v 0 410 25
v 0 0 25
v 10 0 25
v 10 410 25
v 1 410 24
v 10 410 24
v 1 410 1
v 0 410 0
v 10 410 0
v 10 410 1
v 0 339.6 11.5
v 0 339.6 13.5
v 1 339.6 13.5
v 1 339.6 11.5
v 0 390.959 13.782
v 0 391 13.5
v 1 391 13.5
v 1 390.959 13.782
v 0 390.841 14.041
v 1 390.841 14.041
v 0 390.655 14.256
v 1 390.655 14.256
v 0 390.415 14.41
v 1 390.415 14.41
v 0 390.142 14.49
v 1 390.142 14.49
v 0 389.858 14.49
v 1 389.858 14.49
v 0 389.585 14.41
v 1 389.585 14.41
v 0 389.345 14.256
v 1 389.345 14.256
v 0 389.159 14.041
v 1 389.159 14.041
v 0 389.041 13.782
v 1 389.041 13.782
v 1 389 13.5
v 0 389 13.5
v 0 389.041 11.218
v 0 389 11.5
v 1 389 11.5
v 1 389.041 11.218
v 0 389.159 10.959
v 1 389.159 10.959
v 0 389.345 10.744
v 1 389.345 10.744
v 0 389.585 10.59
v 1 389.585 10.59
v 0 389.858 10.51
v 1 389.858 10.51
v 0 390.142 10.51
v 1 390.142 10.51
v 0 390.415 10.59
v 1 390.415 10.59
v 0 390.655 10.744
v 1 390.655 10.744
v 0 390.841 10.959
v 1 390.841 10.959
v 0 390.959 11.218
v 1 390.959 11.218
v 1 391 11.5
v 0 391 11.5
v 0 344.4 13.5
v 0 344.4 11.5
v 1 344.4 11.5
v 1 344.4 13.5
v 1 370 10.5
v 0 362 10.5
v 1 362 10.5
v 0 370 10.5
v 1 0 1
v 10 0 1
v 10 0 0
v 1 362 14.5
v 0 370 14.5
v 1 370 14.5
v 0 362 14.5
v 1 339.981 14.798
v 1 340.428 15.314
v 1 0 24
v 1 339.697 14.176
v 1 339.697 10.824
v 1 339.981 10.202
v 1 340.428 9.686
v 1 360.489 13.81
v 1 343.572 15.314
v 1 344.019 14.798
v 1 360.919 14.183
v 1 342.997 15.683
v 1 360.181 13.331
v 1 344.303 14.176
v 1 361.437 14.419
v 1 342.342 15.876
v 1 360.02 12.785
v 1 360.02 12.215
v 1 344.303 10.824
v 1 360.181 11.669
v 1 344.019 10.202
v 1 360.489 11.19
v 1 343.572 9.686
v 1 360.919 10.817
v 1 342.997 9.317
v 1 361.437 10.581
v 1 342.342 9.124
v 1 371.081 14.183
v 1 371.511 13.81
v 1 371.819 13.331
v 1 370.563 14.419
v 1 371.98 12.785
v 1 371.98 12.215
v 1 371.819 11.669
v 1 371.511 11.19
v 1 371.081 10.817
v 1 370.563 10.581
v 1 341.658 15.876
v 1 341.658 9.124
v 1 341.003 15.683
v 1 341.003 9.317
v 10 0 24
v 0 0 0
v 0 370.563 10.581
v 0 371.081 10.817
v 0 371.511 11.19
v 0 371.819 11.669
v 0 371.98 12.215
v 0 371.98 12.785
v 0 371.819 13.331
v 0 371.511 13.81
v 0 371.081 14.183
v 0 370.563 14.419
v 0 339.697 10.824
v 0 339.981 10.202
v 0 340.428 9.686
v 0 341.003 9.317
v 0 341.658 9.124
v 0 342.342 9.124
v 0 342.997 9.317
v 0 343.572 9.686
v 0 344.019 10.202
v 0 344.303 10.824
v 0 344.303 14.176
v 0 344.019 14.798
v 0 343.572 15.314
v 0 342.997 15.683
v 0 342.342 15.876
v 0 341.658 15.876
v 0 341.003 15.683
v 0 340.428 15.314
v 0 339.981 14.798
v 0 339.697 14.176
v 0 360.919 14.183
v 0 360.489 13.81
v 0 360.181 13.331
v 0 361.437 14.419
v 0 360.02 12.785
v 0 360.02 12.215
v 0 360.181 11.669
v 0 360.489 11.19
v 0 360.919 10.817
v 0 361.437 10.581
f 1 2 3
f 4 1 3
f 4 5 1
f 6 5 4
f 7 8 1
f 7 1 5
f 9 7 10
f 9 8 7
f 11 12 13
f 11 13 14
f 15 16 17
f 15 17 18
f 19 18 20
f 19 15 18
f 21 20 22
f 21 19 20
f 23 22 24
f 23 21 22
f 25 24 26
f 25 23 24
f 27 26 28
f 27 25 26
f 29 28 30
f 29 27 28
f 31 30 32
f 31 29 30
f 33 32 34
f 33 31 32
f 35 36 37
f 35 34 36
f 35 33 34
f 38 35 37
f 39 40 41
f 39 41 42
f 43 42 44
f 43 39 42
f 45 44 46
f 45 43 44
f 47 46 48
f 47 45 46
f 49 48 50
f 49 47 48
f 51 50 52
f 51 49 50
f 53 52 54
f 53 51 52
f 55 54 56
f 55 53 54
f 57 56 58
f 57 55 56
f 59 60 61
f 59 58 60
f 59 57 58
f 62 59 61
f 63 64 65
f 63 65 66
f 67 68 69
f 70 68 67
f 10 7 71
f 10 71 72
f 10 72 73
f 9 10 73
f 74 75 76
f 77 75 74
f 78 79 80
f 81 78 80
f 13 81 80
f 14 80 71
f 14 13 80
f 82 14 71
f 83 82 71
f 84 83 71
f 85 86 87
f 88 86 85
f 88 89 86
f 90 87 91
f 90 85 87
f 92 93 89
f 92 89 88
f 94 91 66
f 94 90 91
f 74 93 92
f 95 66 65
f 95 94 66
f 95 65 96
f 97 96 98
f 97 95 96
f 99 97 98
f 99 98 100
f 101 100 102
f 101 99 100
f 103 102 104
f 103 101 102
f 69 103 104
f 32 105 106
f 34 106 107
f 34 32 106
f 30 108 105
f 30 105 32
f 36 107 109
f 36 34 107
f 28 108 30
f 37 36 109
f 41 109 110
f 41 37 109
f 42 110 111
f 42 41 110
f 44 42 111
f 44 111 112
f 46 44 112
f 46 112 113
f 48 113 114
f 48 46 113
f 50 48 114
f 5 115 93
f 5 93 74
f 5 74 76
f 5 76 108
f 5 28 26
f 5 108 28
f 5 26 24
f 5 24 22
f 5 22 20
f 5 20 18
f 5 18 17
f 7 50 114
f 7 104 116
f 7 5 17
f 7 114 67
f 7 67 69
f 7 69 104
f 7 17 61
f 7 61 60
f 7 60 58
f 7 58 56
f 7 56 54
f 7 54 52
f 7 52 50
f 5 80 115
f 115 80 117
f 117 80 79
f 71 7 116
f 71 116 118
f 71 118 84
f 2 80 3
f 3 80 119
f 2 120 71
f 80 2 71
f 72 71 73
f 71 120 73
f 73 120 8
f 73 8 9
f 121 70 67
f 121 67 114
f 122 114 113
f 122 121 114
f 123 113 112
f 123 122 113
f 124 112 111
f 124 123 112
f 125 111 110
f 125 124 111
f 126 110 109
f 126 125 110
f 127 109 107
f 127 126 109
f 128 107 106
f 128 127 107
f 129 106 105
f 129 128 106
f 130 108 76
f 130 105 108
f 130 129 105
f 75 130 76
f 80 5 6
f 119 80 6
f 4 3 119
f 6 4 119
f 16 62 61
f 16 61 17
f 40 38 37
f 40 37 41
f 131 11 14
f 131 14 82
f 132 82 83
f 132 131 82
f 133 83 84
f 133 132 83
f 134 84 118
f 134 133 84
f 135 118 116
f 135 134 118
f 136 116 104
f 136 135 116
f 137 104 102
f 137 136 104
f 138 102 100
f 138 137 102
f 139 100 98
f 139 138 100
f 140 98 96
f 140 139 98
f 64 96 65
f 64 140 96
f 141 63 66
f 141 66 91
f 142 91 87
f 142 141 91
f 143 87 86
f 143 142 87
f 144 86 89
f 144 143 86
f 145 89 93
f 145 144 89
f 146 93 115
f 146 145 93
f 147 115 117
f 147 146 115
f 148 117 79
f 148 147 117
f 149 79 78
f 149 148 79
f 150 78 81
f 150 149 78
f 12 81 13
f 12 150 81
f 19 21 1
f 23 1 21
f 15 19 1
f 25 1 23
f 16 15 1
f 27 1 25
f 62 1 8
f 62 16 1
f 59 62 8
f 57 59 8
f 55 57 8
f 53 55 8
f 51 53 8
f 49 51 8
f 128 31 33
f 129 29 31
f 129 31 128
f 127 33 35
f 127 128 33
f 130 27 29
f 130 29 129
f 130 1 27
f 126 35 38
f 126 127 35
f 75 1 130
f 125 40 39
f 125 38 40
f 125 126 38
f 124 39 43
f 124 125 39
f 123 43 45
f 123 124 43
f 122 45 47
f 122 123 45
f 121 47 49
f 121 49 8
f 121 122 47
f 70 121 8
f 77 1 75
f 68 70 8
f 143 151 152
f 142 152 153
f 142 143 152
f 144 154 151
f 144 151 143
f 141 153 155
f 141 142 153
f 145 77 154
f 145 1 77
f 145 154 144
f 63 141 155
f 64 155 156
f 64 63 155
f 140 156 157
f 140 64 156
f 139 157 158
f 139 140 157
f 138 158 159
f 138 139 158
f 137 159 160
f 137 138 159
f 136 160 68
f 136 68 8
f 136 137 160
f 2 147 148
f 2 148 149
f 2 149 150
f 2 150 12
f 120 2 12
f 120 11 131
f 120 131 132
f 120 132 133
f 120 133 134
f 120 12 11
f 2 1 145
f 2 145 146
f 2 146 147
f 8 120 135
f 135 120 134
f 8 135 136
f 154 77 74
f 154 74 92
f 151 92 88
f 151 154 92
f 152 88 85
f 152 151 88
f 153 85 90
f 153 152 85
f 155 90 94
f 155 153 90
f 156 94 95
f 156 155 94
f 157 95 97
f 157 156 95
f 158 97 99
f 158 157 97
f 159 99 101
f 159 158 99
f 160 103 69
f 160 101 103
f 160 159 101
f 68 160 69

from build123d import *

# Parameters (mm, degrees)
SKETCH1_W           = 10
SKETCH1_H           = 25
BOSS_EXTRUDE1_DEPTH = 410
SKETCH2_W           = 9
SKETCH2_H           = 23
CUT_EXTRUDE1_DEPTH  = 410
CUT_EXTRUDE2_DEPTH  = 410
CUT_EXTRUDE3_DEPTH  = 410
CUT_EXTRUDE4_DEPTH  = 410


with BuildPart() as part:
    # Sketch1 → Boss-Extrude1 (new body)
    with BuildSketch(Plane(origin=(0, 0, 0), x_dir=(1, 0, 0), z_dir=(0, 1, 0))):
        with Locations((5, -12.5)):
            Rectangle(SKETCH1_W, SKETCH1_H)
    extrude(amount=BOSS_EXTRUDE1_DEPTH)

    # Sketch2 → Cut-Extrude1 (cut)
    with BuildSketch(Plane(origin=(0, 410, 0), x_dir=(1, 0, 0), z_dir=(0, 1, 0))):
        with Locations((5.5, -12.5)):
            Rectangle(SKETCH2_W, SKETCH2_H)
    extrude(amount=-CUT_EXTRUDE1_DEPTH, mode=Mode.SUBTRACT)

    # Sketch3 → Cut-Extrude2 (cut)
    with BuildSketch(Plane.ZY):
        with BuildLine():
            Line((11.5, 391), (13.5, 391))
            ThreePointArc((13.5, 391), (14.5, 390), (13.5, 389))
            Line((13.5, 389), (11.5, 389))
            ThreePointArc((11.5, 389), (10.5, 390), (11.5, 391))
        make_face()
    extrude(amount=-CUT_EXTRUDE2_DEPTH, mode=Mode.SUBTRACT)

    # Sketch3<3> → Cut-Extrude3 (cut)
    with BuildSketch(Plane.ZY):
        with BuildLine():
            Line((14.5, 370), (14.5, 362))
            ThreePointArc((14.5, 362), (12.5, 360), (10.5, 362))
            Line((10.5, 362), (10.5, 370))
            ThreePointArc((10.5, 370), (12.5, 372), (14.5, 370))
        make_face()
    extrude(amount=-CUT_EXTRUDE3_DEPTH, mode=Mode.SUBTRACT)

    # Sketch3<4> → Cut-Extrude4 (cut)
    with BuildSketch(Plane.ZY):
        with BuildLine():
            Line((11.5, 344.4), (13.5, 344.4))
            ThreePointArc((13.5, 344.4), (15.9, 342), (13.5, 339.6))
            Line((13.5, 339.6), (11.5, 339.6))
            ThreePointArc((11.5, 339.6), (9.1, 342), (11.5, 344.4))
        make_face()
    extrude(amount=-CUT_EXTRUDE4_DEPTH, mode=Mode.SUBTRACT)


solid = part.part
